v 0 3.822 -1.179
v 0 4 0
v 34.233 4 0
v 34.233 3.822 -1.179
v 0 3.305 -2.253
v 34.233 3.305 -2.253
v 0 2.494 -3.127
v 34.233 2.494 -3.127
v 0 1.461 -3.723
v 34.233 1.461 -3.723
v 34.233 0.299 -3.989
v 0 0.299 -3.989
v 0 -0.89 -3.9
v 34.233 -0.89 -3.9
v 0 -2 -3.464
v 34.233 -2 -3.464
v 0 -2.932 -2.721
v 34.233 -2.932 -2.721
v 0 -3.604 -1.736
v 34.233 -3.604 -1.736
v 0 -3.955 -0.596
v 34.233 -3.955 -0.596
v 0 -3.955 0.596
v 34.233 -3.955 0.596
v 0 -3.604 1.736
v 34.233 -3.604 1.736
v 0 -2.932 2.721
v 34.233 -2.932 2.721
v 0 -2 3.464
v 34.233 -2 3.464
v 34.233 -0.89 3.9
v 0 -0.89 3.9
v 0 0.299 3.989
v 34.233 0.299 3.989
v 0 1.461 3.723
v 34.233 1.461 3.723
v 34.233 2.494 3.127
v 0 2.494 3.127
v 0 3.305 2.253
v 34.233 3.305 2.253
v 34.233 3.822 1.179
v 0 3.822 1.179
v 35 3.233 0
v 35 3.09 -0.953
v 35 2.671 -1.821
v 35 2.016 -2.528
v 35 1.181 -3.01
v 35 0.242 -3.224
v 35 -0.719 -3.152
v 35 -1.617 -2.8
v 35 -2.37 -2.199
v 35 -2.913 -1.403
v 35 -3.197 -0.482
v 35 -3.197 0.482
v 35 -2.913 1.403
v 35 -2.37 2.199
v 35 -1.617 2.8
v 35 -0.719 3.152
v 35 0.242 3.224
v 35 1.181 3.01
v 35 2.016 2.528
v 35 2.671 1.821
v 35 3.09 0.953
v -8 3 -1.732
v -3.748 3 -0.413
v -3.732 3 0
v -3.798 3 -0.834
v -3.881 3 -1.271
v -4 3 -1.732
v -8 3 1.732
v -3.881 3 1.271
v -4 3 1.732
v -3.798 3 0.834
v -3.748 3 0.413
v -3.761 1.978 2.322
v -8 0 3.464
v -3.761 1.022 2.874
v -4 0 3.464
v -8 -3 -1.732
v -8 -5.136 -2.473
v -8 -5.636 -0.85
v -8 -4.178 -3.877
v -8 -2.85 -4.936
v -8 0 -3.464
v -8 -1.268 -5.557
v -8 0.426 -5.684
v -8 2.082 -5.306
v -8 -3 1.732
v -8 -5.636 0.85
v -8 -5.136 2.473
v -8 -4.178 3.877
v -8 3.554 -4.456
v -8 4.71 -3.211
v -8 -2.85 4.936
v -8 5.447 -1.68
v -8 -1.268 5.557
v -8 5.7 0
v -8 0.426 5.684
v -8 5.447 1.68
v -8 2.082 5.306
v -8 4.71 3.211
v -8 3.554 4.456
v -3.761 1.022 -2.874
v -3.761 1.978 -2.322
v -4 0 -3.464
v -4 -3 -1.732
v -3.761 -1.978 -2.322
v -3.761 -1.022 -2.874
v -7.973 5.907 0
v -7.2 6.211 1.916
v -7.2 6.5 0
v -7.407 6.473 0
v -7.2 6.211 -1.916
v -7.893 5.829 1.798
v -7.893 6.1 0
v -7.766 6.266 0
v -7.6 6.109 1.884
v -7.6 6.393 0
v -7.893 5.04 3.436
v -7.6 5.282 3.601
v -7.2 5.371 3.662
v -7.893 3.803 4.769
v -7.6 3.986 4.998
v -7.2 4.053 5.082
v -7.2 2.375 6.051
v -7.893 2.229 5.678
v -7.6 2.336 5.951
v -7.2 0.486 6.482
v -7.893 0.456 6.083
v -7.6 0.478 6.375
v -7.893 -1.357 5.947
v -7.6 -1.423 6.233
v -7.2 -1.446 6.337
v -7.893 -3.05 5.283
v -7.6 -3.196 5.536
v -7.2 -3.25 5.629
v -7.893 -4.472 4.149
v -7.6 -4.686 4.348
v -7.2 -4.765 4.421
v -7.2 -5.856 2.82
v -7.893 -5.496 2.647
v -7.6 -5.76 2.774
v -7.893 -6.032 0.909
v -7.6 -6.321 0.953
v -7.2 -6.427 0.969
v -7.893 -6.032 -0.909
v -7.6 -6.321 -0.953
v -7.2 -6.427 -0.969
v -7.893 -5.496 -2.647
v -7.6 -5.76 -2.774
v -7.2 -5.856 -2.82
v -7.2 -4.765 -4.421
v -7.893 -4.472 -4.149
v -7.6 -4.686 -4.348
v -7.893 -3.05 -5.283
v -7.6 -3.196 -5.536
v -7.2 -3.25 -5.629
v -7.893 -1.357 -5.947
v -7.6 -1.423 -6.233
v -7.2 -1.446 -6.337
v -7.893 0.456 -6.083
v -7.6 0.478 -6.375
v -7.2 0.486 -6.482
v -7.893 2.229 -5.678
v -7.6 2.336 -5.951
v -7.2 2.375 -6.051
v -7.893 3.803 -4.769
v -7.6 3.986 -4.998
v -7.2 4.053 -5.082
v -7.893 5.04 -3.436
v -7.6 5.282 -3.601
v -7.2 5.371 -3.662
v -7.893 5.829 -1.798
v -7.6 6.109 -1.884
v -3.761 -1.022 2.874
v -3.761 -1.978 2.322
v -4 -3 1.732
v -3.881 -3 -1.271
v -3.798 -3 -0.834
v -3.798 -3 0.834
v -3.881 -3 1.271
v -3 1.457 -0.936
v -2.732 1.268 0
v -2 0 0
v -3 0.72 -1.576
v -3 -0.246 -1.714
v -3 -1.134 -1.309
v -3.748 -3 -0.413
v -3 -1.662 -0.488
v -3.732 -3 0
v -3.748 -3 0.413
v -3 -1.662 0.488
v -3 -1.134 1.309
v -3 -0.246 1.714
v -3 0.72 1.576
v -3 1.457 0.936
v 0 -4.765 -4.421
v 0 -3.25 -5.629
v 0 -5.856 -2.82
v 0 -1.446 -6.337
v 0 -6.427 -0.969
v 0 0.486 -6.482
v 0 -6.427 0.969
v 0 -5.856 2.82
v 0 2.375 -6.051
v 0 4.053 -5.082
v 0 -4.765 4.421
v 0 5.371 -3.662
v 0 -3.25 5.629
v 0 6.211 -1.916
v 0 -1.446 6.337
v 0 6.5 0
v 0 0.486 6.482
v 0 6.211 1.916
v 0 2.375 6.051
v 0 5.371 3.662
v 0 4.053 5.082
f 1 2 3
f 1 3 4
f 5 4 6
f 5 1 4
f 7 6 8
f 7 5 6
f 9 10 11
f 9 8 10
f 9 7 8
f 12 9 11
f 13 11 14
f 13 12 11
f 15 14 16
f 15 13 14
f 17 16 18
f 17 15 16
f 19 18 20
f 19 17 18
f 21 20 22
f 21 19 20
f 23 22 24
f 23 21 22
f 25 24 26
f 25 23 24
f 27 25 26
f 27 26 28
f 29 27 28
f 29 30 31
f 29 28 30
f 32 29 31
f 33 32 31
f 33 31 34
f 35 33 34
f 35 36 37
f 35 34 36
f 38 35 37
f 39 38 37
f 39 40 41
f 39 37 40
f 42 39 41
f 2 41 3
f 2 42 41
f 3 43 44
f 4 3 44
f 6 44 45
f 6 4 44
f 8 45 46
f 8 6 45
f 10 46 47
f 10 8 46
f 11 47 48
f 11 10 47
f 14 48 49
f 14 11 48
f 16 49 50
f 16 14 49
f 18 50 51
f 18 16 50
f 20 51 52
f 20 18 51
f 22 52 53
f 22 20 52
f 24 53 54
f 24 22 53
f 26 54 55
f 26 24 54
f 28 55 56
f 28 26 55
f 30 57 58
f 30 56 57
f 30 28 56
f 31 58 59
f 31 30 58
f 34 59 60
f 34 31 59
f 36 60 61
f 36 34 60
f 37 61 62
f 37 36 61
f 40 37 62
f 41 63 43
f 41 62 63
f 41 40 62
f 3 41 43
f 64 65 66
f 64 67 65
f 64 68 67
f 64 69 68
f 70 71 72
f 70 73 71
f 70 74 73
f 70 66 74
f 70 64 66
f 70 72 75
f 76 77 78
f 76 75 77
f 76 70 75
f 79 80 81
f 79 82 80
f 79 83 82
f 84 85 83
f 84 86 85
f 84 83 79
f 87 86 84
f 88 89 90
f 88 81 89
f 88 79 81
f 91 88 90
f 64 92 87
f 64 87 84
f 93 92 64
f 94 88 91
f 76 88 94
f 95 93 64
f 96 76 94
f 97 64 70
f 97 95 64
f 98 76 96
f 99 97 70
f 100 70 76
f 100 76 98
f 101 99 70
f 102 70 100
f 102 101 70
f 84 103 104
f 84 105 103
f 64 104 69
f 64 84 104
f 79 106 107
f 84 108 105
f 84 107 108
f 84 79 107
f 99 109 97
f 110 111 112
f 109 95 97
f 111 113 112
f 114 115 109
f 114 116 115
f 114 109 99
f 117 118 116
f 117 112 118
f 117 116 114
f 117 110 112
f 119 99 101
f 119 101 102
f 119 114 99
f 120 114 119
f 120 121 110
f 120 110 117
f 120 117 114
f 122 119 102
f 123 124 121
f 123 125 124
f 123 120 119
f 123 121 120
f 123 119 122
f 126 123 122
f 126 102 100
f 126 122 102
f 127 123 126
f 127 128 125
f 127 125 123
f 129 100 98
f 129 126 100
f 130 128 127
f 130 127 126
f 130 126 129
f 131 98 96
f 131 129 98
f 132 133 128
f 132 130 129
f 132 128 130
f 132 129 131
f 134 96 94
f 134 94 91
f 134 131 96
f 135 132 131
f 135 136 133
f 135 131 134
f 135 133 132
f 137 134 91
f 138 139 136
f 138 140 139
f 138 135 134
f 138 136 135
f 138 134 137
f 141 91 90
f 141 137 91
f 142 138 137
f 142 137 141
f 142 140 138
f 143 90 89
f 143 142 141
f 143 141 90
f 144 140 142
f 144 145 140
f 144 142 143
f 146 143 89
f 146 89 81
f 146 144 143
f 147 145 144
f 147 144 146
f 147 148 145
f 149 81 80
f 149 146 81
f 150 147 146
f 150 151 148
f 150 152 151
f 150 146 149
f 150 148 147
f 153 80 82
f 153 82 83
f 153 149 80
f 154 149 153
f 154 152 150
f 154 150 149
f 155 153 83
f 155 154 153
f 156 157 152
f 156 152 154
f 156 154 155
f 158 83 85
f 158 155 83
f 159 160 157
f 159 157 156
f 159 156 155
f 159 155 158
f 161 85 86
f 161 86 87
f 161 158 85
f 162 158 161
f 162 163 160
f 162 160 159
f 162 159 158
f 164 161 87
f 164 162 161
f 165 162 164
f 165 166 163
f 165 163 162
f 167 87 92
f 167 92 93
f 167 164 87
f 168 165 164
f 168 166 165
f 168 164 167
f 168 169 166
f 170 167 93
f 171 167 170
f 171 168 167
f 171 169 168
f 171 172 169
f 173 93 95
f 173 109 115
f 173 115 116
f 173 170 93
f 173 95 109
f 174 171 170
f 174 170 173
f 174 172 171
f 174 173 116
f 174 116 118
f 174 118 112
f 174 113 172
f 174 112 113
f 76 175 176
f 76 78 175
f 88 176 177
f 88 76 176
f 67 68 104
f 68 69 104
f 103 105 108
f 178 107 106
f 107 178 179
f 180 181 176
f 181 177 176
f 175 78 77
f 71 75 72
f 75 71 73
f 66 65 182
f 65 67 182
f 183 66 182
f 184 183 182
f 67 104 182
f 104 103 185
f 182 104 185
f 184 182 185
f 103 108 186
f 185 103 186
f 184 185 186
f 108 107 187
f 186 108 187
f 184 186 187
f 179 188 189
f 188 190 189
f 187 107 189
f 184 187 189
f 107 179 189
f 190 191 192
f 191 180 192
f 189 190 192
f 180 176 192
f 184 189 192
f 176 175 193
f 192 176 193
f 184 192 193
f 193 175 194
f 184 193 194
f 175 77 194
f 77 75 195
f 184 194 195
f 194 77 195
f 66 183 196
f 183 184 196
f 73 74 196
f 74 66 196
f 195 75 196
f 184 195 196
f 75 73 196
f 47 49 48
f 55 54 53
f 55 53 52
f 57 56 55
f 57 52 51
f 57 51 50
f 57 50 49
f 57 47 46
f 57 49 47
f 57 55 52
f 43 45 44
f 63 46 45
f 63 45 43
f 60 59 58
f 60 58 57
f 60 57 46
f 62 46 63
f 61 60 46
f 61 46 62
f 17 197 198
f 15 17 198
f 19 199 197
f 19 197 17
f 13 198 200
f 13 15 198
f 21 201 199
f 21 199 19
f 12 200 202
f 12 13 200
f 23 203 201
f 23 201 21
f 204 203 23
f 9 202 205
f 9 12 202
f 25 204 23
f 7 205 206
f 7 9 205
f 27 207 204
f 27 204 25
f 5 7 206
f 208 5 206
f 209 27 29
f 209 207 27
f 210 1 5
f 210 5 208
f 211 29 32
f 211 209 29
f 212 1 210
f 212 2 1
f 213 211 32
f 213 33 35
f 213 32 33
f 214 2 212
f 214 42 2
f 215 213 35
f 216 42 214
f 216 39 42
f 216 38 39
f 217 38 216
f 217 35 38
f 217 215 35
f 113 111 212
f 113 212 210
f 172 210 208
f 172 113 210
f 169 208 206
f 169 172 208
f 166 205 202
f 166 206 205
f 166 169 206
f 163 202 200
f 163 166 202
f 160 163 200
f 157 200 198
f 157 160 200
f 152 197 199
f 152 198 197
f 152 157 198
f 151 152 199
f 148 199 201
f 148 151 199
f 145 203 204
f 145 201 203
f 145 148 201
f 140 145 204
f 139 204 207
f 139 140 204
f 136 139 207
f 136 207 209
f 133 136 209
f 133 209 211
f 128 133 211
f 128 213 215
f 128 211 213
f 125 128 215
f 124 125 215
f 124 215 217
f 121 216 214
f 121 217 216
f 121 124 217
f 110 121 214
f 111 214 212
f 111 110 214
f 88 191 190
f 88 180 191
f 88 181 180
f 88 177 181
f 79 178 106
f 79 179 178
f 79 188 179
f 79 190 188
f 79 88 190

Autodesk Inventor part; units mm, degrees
ref_plane "YZ Plane" through (0, 0, 0) normal (1, 0, 0) x (0, 1, 0)
ref_plane "XZ Plane" through (0, 0, 0) normal (0, 1, 0) x (-1, 0, 0)
ref_plane "XY Plane" through (0, 0, 0) normal (0, 0, 1) x (1, 0, 0)
sketch "Sketch1" plane through (0, 0, 0) normal (0, 0, 1) x (1, 0, 0)
  line L0 (-2, 0) -> (35, 0)
  line L1 (35, 0) -> (35, 4)
  line L2 (35, 4) -> (3.125, 4)
  line L3 (3.125, 4) -> (2.3581, 4)
  line L4 (2.3581, 4) -> (0, 4)
  line L5 (0, 4) -> (0, 6.5)
  line L6 (0, 6.5) -> (-8, 6.5)
  line L7 (-8, 6.5) -> (-8, 3.4641)
  line L8 (-8, 3.4641) -> (-4, 3.4641)
  line L9 (-4, 3.4641) -> (-2, 0)
  line L10 (-12.3, 0) -> (47.9, 0) projected
  line L11 (0, -0.65) -> (0, 8.45) projected
  line L12 (3.125, 4) -> (0, 4) construction
  dimension "d1" = 31.875
  dimension "d2" = 0.7669
  dimension "d3" = 8
  dimension "d4" = 4
  dimension "d5" = 60
  dimension "d6" = 8
  dimension "d7" = 8
  dimension "d8" = 6.9282
  dimension "d9" = 13
  dimension "d26" = 35
revolve "Body" add sketch "Sketch1" angle 360 about axis through (-2, 0, 0) along (1, 0, 0)
sketch "Sketch2" plane through (-8, 0, 0) normal (-1, 0, 0) x (0, 0, 1)
  circle A0 centre (0, 0) radius 3.4641 projected
  line L0 (0, -7.8) -> (0, 10.4) projected
  line L1 (-7.8, 0) -> (10.4, 0) projected
  line L2 (3.4641, 0) -> (1.7321, -3)
  line L3 (1.7321, -3) -> (-1.7321, -3)
  line L4 (-1.7321, -3) -> (-3.4641, 0)
  line L5 (-3.4641, 0) -> (-1.7321, 3)
  line L6 (-1.7321, 3) -> (1.7321, 3)
  line L7 (1.7321, 3) -> (3.4641, 0)
extrude "Slot" add sketch "Sketch2" against normal up to next contours L7 A0 | A0 L2 | L6 L0 A0 | A0 L0 L3 | L0 L6 A0 | A0 L3 L0 | L4 A0 | A0 L5
fillet "Fillet1" radius 0.8 1 edges at (-8, -6.5, 0)
thread "Thread" size "M8x1.25" class "6g" standard "ISO Metric profile" length 31.875
chamfer "Chamfer1" distance 0.7668 distance2 0.7668 1 edges at (35, -4, 0) measured on face at (35, -0.4013, -0.6579)
equation "\"d1\" = GEL"
equation "\"d3\" = KOH"
equation "\"d4\" = INTI"
equation "\"d6\" = GD"
equation "\"d7\" = BDM"
equation "\"d8\" = 1.1547 * SW"
equation "\"d9\" = KOD"
equation "\"d26\" = NLG"
equation "\"d17\" = RR"
equation "\"d13\" = GEL"
equation "\"d15\" = -0.5 * SPD + 0.5 * GD"
equation "\"d16\" = GUL"
equation "\"GD\" = NND"
equation "\"NLG\" = 35"
equation "\"GEL\" = 31.875"
equation "\"KOD\" = 13"
equation "\"KOH\" = NND"
equation "\"INTI\" = 4"
equation "\"GAL\" = 0.61345 * TPU"
equation "\"GUL\" = 0.61345 * TPU"
equation "\"BDM\" = NND"
equation "\"SW\" = 6"
equation "\"RR\" = 0.1 * NND"
equation "\"SPD\" = NND - 1.2269 * TPU"
equation "\"TOA\" = 30deg"
equation "\"PTC\" = TPU"
equation "\"GD1\" = THREADDIA - 1.2269 * TPU"
equation "\"TPU\" = 1.25"
equation "\"THREADDIA\" = 8"
equation "\"FAWI\" = 45deg"
equation "\"E0\" = 1.155 * SW"
equation "\"NND\" = 8"
properties part number "BS 4168 - M8 x 35"
